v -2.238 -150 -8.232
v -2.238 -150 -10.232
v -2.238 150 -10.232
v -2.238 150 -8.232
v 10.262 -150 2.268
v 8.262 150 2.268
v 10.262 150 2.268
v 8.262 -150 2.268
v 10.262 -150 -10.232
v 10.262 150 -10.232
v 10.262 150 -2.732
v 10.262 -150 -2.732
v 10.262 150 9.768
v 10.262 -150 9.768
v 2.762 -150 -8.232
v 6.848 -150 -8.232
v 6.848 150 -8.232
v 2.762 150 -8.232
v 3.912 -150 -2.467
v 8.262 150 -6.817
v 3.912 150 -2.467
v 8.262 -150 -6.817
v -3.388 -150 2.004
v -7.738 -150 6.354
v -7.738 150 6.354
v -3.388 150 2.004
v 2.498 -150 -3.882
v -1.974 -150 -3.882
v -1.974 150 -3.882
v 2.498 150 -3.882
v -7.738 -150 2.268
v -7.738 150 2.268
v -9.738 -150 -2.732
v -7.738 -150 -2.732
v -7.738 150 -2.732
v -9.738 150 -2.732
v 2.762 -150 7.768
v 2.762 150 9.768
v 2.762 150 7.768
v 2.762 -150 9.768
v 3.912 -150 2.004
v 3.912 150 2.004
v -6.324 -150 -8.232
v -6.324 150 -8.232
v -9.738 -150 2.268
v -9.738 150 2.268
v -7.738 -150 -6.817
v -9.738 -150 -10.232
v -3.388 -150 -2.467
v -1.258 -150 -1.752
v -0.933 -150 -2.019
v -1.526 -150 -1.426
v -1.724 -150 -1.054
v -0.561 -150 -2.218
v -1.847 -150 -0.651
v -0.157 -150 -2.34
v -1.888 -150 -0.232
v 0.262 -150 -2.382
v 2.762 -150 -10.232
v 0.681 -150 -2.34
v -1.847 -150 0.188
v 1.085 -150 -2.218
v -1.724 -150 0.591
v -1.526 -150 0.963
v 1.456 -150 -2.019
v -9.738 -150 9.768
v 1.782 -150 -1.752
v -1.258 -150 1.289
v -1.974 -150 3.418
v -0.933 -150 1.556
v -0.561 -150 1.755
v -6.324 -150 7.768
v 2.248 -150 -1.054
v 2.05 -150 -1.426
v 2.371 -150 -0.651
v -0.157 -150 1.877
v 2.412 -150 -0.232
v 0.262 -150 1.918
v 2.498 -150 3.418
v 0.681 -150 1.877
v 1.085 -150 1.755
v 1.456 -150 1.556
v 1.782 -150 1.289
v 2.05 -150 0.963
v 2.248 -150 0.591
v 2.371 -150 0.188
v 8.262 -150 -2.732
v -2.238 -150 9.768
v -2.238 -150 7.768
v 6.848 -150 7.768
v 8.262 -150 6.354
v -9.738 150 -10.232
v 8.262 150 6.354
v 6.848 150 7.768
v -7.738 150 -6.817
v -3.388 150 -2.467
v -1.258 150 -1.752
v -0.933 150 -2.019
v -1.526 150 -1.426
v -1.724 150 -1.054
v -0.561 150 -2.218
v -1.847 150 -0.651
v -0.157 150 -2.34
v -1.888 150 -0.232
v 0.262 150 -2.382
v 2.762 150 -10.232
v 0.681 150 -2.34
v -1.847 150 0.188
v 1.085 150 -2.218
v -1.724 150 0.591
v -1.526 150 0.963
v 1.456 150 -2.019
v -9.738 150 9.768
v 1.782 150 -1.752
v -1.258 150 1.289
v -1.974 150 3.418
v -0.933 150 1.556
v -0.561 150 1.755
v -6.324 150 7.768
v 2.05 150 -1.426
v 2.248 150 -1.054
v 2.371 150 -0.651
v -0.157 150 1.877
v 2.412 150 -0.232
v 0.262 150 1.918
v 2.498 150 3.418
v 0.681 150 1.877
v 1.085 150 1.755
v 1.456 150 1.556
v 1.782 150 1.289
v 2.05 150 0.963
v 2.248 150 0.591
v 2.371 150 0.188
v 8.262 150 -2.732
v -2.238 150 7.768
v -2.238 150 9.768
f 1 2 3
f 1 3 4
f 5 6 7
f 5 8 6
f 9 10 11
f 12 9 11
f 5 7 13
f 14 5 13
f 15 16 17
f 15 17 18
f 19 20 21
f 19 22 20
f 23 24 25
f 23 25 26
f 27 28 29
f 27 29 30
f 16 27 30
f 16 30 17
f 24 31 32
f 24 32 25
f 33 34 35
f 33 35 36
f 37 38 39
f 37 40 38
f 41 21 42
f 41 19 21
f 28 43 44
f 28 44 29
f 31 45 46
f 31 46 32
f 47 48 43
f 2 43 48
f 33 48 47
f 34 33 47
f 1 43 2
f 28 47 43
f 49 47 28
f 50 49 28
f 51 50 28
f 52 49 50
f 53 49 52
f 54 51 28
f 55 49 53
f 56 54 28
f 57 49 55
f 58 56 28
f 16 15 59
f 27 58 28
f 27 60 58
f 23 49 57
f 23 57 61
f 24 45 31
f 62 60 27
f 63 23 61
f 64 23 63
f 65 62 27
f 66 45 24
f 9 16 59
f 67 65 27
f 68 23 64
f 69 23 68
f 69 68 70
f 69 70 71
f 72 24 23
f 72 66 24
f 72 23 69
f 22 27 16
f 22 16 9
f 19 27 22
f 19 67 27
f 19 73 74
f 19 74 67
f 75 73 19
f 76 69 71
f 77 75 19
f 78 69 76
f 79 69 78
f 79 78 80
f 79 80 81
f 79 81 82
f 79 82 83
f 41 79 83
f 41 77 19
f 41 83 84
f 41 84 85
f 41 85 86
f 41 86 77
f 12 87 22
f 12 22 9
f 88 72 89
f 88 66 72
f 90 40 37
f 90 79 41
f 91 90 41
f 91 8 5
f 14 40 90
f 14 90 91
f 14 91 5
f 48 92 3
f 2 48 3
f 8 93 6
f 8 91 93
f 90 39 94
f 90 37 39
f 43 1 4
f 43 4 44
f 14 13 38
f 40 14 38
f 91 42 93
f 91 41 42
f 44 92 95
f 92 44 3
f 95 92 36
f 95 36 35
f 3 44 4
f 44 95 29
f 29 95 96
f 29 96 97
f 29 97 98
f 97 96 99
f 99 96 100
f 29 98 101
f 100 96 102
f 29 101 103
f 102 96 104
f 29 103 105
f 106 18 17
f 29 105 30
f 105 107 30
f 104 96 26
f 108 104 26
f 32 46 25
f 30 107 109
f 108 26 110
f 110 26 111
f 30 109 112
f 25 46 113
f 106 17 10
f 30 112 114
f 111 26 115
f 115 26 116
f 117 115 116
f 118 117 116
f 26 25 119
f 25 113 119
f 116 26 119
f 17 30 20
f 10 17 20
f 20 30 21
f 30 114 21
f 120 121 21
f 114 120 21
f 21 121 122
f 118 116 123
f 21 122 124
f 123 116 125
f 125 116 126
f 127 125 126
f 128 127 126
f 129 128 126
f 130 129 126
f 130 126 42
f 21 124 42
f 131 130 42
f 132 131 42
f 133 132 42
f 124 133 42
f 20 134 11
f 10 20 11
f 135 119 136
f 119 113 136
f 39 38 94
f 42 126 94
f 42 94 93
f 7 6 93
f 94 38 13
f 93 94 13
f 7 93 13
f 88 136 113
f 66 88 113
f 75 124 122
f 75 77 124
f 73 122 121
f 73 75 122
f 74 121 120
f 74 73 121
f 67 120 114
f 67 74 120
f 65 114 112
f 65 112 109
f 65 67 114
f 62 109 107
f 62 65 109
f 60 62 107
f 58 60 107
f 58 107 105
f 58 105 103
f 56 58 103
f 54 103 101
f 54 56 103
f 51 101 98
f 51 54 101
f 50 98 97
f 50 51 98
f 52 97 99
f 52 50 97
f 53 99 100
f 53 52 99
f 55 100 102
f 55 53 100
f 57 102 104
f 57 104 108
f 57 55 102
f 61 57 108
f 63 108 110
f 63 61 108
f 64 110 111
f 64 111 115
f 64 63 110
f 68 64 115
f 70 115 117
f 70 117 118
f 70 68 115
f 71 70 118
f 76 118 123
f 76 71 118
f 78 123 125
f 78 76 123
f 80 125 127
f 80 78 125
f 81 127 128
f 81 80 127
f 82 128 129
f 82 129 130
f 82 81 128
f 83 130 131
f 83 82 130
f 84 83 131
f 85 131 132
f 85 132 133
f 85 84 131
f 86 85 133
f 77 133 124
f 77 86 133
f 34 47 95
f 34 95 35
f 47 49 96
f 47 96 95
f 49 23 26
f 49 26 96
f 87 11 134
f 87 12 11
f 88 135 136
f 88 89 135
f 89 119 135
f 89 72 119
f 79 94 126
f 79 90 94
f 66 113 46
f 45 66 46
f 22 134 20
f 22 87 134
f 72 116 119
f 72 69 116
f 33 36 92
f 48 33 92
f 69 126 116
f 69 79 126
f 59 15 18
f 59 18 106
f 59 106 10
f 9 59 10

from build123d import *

# Parameters (mm, degrees)
F1_DEPTH      = 150
F1_DEPTH_BACK = 150


with BuildPart() as f1:
    # F0 (on Front) → F1 (new body, two sides)
    with BuildSketch(Plane.XZ) as f1_sk:
        Polygon((-2.238045, 9.768403), (-9.738045, 9.768403), (-9.738045, 2.268403), (-7.738045, 2.268403), (-7.738045, 6.35419), (-3.388045, 2.00419), (-3.388045, -0.231597), (-3.388045, -2.467383), (-7.738045, -6.817383), (-7.738045, -2.731597), (-9.738045, -2.731597), (-9.738045, -10.231597), (-2.238045, -10.231597), (-2.238045, -8.231597), (-6.323832, -8.231597), (-1.973832, -3.881597), (2.497741, -3.881597), (6.847741, -8.231597), (2.761955, -8.231597), (2.761955, -10.231597), (10.261955, -10.231597), (10.261955, -2.731597), (8.261955, -2.731597), (8.261955, -6.817383), (3.911955, -2.467383), (3.911955, -0.231597), (3.911955, 2.00419), (8.261955, 6.35419), (8.261955, 2.268403), (10.261955, 2.268403), (10.261955, 9.768403), (2.761955, 9.768403), (2.761955, 7.768403), (6.847741, 7.768403), (2.497741, 3.418403), (-1.973832, 3.418403), (-6.323832, 7.768403), (-2.238045, 7.768403), align=None)
        with BuildLine():
            ThreePointArc((-1.888045, -0.231597), (0.261955, 1.918403), (2.411955, -0.231597))
            ThreePointArc((2.411955, -0.231597), (0.261955, -2.381597), (-1.888045, -0.231597))
        make_face(mode=Mode.SUBTRACT)
    extrude(amount=F1_DEPTH)
    extrude(f1_sk.sketch, amount=-F1_DEPTH_BACK)


solid = f1.part
